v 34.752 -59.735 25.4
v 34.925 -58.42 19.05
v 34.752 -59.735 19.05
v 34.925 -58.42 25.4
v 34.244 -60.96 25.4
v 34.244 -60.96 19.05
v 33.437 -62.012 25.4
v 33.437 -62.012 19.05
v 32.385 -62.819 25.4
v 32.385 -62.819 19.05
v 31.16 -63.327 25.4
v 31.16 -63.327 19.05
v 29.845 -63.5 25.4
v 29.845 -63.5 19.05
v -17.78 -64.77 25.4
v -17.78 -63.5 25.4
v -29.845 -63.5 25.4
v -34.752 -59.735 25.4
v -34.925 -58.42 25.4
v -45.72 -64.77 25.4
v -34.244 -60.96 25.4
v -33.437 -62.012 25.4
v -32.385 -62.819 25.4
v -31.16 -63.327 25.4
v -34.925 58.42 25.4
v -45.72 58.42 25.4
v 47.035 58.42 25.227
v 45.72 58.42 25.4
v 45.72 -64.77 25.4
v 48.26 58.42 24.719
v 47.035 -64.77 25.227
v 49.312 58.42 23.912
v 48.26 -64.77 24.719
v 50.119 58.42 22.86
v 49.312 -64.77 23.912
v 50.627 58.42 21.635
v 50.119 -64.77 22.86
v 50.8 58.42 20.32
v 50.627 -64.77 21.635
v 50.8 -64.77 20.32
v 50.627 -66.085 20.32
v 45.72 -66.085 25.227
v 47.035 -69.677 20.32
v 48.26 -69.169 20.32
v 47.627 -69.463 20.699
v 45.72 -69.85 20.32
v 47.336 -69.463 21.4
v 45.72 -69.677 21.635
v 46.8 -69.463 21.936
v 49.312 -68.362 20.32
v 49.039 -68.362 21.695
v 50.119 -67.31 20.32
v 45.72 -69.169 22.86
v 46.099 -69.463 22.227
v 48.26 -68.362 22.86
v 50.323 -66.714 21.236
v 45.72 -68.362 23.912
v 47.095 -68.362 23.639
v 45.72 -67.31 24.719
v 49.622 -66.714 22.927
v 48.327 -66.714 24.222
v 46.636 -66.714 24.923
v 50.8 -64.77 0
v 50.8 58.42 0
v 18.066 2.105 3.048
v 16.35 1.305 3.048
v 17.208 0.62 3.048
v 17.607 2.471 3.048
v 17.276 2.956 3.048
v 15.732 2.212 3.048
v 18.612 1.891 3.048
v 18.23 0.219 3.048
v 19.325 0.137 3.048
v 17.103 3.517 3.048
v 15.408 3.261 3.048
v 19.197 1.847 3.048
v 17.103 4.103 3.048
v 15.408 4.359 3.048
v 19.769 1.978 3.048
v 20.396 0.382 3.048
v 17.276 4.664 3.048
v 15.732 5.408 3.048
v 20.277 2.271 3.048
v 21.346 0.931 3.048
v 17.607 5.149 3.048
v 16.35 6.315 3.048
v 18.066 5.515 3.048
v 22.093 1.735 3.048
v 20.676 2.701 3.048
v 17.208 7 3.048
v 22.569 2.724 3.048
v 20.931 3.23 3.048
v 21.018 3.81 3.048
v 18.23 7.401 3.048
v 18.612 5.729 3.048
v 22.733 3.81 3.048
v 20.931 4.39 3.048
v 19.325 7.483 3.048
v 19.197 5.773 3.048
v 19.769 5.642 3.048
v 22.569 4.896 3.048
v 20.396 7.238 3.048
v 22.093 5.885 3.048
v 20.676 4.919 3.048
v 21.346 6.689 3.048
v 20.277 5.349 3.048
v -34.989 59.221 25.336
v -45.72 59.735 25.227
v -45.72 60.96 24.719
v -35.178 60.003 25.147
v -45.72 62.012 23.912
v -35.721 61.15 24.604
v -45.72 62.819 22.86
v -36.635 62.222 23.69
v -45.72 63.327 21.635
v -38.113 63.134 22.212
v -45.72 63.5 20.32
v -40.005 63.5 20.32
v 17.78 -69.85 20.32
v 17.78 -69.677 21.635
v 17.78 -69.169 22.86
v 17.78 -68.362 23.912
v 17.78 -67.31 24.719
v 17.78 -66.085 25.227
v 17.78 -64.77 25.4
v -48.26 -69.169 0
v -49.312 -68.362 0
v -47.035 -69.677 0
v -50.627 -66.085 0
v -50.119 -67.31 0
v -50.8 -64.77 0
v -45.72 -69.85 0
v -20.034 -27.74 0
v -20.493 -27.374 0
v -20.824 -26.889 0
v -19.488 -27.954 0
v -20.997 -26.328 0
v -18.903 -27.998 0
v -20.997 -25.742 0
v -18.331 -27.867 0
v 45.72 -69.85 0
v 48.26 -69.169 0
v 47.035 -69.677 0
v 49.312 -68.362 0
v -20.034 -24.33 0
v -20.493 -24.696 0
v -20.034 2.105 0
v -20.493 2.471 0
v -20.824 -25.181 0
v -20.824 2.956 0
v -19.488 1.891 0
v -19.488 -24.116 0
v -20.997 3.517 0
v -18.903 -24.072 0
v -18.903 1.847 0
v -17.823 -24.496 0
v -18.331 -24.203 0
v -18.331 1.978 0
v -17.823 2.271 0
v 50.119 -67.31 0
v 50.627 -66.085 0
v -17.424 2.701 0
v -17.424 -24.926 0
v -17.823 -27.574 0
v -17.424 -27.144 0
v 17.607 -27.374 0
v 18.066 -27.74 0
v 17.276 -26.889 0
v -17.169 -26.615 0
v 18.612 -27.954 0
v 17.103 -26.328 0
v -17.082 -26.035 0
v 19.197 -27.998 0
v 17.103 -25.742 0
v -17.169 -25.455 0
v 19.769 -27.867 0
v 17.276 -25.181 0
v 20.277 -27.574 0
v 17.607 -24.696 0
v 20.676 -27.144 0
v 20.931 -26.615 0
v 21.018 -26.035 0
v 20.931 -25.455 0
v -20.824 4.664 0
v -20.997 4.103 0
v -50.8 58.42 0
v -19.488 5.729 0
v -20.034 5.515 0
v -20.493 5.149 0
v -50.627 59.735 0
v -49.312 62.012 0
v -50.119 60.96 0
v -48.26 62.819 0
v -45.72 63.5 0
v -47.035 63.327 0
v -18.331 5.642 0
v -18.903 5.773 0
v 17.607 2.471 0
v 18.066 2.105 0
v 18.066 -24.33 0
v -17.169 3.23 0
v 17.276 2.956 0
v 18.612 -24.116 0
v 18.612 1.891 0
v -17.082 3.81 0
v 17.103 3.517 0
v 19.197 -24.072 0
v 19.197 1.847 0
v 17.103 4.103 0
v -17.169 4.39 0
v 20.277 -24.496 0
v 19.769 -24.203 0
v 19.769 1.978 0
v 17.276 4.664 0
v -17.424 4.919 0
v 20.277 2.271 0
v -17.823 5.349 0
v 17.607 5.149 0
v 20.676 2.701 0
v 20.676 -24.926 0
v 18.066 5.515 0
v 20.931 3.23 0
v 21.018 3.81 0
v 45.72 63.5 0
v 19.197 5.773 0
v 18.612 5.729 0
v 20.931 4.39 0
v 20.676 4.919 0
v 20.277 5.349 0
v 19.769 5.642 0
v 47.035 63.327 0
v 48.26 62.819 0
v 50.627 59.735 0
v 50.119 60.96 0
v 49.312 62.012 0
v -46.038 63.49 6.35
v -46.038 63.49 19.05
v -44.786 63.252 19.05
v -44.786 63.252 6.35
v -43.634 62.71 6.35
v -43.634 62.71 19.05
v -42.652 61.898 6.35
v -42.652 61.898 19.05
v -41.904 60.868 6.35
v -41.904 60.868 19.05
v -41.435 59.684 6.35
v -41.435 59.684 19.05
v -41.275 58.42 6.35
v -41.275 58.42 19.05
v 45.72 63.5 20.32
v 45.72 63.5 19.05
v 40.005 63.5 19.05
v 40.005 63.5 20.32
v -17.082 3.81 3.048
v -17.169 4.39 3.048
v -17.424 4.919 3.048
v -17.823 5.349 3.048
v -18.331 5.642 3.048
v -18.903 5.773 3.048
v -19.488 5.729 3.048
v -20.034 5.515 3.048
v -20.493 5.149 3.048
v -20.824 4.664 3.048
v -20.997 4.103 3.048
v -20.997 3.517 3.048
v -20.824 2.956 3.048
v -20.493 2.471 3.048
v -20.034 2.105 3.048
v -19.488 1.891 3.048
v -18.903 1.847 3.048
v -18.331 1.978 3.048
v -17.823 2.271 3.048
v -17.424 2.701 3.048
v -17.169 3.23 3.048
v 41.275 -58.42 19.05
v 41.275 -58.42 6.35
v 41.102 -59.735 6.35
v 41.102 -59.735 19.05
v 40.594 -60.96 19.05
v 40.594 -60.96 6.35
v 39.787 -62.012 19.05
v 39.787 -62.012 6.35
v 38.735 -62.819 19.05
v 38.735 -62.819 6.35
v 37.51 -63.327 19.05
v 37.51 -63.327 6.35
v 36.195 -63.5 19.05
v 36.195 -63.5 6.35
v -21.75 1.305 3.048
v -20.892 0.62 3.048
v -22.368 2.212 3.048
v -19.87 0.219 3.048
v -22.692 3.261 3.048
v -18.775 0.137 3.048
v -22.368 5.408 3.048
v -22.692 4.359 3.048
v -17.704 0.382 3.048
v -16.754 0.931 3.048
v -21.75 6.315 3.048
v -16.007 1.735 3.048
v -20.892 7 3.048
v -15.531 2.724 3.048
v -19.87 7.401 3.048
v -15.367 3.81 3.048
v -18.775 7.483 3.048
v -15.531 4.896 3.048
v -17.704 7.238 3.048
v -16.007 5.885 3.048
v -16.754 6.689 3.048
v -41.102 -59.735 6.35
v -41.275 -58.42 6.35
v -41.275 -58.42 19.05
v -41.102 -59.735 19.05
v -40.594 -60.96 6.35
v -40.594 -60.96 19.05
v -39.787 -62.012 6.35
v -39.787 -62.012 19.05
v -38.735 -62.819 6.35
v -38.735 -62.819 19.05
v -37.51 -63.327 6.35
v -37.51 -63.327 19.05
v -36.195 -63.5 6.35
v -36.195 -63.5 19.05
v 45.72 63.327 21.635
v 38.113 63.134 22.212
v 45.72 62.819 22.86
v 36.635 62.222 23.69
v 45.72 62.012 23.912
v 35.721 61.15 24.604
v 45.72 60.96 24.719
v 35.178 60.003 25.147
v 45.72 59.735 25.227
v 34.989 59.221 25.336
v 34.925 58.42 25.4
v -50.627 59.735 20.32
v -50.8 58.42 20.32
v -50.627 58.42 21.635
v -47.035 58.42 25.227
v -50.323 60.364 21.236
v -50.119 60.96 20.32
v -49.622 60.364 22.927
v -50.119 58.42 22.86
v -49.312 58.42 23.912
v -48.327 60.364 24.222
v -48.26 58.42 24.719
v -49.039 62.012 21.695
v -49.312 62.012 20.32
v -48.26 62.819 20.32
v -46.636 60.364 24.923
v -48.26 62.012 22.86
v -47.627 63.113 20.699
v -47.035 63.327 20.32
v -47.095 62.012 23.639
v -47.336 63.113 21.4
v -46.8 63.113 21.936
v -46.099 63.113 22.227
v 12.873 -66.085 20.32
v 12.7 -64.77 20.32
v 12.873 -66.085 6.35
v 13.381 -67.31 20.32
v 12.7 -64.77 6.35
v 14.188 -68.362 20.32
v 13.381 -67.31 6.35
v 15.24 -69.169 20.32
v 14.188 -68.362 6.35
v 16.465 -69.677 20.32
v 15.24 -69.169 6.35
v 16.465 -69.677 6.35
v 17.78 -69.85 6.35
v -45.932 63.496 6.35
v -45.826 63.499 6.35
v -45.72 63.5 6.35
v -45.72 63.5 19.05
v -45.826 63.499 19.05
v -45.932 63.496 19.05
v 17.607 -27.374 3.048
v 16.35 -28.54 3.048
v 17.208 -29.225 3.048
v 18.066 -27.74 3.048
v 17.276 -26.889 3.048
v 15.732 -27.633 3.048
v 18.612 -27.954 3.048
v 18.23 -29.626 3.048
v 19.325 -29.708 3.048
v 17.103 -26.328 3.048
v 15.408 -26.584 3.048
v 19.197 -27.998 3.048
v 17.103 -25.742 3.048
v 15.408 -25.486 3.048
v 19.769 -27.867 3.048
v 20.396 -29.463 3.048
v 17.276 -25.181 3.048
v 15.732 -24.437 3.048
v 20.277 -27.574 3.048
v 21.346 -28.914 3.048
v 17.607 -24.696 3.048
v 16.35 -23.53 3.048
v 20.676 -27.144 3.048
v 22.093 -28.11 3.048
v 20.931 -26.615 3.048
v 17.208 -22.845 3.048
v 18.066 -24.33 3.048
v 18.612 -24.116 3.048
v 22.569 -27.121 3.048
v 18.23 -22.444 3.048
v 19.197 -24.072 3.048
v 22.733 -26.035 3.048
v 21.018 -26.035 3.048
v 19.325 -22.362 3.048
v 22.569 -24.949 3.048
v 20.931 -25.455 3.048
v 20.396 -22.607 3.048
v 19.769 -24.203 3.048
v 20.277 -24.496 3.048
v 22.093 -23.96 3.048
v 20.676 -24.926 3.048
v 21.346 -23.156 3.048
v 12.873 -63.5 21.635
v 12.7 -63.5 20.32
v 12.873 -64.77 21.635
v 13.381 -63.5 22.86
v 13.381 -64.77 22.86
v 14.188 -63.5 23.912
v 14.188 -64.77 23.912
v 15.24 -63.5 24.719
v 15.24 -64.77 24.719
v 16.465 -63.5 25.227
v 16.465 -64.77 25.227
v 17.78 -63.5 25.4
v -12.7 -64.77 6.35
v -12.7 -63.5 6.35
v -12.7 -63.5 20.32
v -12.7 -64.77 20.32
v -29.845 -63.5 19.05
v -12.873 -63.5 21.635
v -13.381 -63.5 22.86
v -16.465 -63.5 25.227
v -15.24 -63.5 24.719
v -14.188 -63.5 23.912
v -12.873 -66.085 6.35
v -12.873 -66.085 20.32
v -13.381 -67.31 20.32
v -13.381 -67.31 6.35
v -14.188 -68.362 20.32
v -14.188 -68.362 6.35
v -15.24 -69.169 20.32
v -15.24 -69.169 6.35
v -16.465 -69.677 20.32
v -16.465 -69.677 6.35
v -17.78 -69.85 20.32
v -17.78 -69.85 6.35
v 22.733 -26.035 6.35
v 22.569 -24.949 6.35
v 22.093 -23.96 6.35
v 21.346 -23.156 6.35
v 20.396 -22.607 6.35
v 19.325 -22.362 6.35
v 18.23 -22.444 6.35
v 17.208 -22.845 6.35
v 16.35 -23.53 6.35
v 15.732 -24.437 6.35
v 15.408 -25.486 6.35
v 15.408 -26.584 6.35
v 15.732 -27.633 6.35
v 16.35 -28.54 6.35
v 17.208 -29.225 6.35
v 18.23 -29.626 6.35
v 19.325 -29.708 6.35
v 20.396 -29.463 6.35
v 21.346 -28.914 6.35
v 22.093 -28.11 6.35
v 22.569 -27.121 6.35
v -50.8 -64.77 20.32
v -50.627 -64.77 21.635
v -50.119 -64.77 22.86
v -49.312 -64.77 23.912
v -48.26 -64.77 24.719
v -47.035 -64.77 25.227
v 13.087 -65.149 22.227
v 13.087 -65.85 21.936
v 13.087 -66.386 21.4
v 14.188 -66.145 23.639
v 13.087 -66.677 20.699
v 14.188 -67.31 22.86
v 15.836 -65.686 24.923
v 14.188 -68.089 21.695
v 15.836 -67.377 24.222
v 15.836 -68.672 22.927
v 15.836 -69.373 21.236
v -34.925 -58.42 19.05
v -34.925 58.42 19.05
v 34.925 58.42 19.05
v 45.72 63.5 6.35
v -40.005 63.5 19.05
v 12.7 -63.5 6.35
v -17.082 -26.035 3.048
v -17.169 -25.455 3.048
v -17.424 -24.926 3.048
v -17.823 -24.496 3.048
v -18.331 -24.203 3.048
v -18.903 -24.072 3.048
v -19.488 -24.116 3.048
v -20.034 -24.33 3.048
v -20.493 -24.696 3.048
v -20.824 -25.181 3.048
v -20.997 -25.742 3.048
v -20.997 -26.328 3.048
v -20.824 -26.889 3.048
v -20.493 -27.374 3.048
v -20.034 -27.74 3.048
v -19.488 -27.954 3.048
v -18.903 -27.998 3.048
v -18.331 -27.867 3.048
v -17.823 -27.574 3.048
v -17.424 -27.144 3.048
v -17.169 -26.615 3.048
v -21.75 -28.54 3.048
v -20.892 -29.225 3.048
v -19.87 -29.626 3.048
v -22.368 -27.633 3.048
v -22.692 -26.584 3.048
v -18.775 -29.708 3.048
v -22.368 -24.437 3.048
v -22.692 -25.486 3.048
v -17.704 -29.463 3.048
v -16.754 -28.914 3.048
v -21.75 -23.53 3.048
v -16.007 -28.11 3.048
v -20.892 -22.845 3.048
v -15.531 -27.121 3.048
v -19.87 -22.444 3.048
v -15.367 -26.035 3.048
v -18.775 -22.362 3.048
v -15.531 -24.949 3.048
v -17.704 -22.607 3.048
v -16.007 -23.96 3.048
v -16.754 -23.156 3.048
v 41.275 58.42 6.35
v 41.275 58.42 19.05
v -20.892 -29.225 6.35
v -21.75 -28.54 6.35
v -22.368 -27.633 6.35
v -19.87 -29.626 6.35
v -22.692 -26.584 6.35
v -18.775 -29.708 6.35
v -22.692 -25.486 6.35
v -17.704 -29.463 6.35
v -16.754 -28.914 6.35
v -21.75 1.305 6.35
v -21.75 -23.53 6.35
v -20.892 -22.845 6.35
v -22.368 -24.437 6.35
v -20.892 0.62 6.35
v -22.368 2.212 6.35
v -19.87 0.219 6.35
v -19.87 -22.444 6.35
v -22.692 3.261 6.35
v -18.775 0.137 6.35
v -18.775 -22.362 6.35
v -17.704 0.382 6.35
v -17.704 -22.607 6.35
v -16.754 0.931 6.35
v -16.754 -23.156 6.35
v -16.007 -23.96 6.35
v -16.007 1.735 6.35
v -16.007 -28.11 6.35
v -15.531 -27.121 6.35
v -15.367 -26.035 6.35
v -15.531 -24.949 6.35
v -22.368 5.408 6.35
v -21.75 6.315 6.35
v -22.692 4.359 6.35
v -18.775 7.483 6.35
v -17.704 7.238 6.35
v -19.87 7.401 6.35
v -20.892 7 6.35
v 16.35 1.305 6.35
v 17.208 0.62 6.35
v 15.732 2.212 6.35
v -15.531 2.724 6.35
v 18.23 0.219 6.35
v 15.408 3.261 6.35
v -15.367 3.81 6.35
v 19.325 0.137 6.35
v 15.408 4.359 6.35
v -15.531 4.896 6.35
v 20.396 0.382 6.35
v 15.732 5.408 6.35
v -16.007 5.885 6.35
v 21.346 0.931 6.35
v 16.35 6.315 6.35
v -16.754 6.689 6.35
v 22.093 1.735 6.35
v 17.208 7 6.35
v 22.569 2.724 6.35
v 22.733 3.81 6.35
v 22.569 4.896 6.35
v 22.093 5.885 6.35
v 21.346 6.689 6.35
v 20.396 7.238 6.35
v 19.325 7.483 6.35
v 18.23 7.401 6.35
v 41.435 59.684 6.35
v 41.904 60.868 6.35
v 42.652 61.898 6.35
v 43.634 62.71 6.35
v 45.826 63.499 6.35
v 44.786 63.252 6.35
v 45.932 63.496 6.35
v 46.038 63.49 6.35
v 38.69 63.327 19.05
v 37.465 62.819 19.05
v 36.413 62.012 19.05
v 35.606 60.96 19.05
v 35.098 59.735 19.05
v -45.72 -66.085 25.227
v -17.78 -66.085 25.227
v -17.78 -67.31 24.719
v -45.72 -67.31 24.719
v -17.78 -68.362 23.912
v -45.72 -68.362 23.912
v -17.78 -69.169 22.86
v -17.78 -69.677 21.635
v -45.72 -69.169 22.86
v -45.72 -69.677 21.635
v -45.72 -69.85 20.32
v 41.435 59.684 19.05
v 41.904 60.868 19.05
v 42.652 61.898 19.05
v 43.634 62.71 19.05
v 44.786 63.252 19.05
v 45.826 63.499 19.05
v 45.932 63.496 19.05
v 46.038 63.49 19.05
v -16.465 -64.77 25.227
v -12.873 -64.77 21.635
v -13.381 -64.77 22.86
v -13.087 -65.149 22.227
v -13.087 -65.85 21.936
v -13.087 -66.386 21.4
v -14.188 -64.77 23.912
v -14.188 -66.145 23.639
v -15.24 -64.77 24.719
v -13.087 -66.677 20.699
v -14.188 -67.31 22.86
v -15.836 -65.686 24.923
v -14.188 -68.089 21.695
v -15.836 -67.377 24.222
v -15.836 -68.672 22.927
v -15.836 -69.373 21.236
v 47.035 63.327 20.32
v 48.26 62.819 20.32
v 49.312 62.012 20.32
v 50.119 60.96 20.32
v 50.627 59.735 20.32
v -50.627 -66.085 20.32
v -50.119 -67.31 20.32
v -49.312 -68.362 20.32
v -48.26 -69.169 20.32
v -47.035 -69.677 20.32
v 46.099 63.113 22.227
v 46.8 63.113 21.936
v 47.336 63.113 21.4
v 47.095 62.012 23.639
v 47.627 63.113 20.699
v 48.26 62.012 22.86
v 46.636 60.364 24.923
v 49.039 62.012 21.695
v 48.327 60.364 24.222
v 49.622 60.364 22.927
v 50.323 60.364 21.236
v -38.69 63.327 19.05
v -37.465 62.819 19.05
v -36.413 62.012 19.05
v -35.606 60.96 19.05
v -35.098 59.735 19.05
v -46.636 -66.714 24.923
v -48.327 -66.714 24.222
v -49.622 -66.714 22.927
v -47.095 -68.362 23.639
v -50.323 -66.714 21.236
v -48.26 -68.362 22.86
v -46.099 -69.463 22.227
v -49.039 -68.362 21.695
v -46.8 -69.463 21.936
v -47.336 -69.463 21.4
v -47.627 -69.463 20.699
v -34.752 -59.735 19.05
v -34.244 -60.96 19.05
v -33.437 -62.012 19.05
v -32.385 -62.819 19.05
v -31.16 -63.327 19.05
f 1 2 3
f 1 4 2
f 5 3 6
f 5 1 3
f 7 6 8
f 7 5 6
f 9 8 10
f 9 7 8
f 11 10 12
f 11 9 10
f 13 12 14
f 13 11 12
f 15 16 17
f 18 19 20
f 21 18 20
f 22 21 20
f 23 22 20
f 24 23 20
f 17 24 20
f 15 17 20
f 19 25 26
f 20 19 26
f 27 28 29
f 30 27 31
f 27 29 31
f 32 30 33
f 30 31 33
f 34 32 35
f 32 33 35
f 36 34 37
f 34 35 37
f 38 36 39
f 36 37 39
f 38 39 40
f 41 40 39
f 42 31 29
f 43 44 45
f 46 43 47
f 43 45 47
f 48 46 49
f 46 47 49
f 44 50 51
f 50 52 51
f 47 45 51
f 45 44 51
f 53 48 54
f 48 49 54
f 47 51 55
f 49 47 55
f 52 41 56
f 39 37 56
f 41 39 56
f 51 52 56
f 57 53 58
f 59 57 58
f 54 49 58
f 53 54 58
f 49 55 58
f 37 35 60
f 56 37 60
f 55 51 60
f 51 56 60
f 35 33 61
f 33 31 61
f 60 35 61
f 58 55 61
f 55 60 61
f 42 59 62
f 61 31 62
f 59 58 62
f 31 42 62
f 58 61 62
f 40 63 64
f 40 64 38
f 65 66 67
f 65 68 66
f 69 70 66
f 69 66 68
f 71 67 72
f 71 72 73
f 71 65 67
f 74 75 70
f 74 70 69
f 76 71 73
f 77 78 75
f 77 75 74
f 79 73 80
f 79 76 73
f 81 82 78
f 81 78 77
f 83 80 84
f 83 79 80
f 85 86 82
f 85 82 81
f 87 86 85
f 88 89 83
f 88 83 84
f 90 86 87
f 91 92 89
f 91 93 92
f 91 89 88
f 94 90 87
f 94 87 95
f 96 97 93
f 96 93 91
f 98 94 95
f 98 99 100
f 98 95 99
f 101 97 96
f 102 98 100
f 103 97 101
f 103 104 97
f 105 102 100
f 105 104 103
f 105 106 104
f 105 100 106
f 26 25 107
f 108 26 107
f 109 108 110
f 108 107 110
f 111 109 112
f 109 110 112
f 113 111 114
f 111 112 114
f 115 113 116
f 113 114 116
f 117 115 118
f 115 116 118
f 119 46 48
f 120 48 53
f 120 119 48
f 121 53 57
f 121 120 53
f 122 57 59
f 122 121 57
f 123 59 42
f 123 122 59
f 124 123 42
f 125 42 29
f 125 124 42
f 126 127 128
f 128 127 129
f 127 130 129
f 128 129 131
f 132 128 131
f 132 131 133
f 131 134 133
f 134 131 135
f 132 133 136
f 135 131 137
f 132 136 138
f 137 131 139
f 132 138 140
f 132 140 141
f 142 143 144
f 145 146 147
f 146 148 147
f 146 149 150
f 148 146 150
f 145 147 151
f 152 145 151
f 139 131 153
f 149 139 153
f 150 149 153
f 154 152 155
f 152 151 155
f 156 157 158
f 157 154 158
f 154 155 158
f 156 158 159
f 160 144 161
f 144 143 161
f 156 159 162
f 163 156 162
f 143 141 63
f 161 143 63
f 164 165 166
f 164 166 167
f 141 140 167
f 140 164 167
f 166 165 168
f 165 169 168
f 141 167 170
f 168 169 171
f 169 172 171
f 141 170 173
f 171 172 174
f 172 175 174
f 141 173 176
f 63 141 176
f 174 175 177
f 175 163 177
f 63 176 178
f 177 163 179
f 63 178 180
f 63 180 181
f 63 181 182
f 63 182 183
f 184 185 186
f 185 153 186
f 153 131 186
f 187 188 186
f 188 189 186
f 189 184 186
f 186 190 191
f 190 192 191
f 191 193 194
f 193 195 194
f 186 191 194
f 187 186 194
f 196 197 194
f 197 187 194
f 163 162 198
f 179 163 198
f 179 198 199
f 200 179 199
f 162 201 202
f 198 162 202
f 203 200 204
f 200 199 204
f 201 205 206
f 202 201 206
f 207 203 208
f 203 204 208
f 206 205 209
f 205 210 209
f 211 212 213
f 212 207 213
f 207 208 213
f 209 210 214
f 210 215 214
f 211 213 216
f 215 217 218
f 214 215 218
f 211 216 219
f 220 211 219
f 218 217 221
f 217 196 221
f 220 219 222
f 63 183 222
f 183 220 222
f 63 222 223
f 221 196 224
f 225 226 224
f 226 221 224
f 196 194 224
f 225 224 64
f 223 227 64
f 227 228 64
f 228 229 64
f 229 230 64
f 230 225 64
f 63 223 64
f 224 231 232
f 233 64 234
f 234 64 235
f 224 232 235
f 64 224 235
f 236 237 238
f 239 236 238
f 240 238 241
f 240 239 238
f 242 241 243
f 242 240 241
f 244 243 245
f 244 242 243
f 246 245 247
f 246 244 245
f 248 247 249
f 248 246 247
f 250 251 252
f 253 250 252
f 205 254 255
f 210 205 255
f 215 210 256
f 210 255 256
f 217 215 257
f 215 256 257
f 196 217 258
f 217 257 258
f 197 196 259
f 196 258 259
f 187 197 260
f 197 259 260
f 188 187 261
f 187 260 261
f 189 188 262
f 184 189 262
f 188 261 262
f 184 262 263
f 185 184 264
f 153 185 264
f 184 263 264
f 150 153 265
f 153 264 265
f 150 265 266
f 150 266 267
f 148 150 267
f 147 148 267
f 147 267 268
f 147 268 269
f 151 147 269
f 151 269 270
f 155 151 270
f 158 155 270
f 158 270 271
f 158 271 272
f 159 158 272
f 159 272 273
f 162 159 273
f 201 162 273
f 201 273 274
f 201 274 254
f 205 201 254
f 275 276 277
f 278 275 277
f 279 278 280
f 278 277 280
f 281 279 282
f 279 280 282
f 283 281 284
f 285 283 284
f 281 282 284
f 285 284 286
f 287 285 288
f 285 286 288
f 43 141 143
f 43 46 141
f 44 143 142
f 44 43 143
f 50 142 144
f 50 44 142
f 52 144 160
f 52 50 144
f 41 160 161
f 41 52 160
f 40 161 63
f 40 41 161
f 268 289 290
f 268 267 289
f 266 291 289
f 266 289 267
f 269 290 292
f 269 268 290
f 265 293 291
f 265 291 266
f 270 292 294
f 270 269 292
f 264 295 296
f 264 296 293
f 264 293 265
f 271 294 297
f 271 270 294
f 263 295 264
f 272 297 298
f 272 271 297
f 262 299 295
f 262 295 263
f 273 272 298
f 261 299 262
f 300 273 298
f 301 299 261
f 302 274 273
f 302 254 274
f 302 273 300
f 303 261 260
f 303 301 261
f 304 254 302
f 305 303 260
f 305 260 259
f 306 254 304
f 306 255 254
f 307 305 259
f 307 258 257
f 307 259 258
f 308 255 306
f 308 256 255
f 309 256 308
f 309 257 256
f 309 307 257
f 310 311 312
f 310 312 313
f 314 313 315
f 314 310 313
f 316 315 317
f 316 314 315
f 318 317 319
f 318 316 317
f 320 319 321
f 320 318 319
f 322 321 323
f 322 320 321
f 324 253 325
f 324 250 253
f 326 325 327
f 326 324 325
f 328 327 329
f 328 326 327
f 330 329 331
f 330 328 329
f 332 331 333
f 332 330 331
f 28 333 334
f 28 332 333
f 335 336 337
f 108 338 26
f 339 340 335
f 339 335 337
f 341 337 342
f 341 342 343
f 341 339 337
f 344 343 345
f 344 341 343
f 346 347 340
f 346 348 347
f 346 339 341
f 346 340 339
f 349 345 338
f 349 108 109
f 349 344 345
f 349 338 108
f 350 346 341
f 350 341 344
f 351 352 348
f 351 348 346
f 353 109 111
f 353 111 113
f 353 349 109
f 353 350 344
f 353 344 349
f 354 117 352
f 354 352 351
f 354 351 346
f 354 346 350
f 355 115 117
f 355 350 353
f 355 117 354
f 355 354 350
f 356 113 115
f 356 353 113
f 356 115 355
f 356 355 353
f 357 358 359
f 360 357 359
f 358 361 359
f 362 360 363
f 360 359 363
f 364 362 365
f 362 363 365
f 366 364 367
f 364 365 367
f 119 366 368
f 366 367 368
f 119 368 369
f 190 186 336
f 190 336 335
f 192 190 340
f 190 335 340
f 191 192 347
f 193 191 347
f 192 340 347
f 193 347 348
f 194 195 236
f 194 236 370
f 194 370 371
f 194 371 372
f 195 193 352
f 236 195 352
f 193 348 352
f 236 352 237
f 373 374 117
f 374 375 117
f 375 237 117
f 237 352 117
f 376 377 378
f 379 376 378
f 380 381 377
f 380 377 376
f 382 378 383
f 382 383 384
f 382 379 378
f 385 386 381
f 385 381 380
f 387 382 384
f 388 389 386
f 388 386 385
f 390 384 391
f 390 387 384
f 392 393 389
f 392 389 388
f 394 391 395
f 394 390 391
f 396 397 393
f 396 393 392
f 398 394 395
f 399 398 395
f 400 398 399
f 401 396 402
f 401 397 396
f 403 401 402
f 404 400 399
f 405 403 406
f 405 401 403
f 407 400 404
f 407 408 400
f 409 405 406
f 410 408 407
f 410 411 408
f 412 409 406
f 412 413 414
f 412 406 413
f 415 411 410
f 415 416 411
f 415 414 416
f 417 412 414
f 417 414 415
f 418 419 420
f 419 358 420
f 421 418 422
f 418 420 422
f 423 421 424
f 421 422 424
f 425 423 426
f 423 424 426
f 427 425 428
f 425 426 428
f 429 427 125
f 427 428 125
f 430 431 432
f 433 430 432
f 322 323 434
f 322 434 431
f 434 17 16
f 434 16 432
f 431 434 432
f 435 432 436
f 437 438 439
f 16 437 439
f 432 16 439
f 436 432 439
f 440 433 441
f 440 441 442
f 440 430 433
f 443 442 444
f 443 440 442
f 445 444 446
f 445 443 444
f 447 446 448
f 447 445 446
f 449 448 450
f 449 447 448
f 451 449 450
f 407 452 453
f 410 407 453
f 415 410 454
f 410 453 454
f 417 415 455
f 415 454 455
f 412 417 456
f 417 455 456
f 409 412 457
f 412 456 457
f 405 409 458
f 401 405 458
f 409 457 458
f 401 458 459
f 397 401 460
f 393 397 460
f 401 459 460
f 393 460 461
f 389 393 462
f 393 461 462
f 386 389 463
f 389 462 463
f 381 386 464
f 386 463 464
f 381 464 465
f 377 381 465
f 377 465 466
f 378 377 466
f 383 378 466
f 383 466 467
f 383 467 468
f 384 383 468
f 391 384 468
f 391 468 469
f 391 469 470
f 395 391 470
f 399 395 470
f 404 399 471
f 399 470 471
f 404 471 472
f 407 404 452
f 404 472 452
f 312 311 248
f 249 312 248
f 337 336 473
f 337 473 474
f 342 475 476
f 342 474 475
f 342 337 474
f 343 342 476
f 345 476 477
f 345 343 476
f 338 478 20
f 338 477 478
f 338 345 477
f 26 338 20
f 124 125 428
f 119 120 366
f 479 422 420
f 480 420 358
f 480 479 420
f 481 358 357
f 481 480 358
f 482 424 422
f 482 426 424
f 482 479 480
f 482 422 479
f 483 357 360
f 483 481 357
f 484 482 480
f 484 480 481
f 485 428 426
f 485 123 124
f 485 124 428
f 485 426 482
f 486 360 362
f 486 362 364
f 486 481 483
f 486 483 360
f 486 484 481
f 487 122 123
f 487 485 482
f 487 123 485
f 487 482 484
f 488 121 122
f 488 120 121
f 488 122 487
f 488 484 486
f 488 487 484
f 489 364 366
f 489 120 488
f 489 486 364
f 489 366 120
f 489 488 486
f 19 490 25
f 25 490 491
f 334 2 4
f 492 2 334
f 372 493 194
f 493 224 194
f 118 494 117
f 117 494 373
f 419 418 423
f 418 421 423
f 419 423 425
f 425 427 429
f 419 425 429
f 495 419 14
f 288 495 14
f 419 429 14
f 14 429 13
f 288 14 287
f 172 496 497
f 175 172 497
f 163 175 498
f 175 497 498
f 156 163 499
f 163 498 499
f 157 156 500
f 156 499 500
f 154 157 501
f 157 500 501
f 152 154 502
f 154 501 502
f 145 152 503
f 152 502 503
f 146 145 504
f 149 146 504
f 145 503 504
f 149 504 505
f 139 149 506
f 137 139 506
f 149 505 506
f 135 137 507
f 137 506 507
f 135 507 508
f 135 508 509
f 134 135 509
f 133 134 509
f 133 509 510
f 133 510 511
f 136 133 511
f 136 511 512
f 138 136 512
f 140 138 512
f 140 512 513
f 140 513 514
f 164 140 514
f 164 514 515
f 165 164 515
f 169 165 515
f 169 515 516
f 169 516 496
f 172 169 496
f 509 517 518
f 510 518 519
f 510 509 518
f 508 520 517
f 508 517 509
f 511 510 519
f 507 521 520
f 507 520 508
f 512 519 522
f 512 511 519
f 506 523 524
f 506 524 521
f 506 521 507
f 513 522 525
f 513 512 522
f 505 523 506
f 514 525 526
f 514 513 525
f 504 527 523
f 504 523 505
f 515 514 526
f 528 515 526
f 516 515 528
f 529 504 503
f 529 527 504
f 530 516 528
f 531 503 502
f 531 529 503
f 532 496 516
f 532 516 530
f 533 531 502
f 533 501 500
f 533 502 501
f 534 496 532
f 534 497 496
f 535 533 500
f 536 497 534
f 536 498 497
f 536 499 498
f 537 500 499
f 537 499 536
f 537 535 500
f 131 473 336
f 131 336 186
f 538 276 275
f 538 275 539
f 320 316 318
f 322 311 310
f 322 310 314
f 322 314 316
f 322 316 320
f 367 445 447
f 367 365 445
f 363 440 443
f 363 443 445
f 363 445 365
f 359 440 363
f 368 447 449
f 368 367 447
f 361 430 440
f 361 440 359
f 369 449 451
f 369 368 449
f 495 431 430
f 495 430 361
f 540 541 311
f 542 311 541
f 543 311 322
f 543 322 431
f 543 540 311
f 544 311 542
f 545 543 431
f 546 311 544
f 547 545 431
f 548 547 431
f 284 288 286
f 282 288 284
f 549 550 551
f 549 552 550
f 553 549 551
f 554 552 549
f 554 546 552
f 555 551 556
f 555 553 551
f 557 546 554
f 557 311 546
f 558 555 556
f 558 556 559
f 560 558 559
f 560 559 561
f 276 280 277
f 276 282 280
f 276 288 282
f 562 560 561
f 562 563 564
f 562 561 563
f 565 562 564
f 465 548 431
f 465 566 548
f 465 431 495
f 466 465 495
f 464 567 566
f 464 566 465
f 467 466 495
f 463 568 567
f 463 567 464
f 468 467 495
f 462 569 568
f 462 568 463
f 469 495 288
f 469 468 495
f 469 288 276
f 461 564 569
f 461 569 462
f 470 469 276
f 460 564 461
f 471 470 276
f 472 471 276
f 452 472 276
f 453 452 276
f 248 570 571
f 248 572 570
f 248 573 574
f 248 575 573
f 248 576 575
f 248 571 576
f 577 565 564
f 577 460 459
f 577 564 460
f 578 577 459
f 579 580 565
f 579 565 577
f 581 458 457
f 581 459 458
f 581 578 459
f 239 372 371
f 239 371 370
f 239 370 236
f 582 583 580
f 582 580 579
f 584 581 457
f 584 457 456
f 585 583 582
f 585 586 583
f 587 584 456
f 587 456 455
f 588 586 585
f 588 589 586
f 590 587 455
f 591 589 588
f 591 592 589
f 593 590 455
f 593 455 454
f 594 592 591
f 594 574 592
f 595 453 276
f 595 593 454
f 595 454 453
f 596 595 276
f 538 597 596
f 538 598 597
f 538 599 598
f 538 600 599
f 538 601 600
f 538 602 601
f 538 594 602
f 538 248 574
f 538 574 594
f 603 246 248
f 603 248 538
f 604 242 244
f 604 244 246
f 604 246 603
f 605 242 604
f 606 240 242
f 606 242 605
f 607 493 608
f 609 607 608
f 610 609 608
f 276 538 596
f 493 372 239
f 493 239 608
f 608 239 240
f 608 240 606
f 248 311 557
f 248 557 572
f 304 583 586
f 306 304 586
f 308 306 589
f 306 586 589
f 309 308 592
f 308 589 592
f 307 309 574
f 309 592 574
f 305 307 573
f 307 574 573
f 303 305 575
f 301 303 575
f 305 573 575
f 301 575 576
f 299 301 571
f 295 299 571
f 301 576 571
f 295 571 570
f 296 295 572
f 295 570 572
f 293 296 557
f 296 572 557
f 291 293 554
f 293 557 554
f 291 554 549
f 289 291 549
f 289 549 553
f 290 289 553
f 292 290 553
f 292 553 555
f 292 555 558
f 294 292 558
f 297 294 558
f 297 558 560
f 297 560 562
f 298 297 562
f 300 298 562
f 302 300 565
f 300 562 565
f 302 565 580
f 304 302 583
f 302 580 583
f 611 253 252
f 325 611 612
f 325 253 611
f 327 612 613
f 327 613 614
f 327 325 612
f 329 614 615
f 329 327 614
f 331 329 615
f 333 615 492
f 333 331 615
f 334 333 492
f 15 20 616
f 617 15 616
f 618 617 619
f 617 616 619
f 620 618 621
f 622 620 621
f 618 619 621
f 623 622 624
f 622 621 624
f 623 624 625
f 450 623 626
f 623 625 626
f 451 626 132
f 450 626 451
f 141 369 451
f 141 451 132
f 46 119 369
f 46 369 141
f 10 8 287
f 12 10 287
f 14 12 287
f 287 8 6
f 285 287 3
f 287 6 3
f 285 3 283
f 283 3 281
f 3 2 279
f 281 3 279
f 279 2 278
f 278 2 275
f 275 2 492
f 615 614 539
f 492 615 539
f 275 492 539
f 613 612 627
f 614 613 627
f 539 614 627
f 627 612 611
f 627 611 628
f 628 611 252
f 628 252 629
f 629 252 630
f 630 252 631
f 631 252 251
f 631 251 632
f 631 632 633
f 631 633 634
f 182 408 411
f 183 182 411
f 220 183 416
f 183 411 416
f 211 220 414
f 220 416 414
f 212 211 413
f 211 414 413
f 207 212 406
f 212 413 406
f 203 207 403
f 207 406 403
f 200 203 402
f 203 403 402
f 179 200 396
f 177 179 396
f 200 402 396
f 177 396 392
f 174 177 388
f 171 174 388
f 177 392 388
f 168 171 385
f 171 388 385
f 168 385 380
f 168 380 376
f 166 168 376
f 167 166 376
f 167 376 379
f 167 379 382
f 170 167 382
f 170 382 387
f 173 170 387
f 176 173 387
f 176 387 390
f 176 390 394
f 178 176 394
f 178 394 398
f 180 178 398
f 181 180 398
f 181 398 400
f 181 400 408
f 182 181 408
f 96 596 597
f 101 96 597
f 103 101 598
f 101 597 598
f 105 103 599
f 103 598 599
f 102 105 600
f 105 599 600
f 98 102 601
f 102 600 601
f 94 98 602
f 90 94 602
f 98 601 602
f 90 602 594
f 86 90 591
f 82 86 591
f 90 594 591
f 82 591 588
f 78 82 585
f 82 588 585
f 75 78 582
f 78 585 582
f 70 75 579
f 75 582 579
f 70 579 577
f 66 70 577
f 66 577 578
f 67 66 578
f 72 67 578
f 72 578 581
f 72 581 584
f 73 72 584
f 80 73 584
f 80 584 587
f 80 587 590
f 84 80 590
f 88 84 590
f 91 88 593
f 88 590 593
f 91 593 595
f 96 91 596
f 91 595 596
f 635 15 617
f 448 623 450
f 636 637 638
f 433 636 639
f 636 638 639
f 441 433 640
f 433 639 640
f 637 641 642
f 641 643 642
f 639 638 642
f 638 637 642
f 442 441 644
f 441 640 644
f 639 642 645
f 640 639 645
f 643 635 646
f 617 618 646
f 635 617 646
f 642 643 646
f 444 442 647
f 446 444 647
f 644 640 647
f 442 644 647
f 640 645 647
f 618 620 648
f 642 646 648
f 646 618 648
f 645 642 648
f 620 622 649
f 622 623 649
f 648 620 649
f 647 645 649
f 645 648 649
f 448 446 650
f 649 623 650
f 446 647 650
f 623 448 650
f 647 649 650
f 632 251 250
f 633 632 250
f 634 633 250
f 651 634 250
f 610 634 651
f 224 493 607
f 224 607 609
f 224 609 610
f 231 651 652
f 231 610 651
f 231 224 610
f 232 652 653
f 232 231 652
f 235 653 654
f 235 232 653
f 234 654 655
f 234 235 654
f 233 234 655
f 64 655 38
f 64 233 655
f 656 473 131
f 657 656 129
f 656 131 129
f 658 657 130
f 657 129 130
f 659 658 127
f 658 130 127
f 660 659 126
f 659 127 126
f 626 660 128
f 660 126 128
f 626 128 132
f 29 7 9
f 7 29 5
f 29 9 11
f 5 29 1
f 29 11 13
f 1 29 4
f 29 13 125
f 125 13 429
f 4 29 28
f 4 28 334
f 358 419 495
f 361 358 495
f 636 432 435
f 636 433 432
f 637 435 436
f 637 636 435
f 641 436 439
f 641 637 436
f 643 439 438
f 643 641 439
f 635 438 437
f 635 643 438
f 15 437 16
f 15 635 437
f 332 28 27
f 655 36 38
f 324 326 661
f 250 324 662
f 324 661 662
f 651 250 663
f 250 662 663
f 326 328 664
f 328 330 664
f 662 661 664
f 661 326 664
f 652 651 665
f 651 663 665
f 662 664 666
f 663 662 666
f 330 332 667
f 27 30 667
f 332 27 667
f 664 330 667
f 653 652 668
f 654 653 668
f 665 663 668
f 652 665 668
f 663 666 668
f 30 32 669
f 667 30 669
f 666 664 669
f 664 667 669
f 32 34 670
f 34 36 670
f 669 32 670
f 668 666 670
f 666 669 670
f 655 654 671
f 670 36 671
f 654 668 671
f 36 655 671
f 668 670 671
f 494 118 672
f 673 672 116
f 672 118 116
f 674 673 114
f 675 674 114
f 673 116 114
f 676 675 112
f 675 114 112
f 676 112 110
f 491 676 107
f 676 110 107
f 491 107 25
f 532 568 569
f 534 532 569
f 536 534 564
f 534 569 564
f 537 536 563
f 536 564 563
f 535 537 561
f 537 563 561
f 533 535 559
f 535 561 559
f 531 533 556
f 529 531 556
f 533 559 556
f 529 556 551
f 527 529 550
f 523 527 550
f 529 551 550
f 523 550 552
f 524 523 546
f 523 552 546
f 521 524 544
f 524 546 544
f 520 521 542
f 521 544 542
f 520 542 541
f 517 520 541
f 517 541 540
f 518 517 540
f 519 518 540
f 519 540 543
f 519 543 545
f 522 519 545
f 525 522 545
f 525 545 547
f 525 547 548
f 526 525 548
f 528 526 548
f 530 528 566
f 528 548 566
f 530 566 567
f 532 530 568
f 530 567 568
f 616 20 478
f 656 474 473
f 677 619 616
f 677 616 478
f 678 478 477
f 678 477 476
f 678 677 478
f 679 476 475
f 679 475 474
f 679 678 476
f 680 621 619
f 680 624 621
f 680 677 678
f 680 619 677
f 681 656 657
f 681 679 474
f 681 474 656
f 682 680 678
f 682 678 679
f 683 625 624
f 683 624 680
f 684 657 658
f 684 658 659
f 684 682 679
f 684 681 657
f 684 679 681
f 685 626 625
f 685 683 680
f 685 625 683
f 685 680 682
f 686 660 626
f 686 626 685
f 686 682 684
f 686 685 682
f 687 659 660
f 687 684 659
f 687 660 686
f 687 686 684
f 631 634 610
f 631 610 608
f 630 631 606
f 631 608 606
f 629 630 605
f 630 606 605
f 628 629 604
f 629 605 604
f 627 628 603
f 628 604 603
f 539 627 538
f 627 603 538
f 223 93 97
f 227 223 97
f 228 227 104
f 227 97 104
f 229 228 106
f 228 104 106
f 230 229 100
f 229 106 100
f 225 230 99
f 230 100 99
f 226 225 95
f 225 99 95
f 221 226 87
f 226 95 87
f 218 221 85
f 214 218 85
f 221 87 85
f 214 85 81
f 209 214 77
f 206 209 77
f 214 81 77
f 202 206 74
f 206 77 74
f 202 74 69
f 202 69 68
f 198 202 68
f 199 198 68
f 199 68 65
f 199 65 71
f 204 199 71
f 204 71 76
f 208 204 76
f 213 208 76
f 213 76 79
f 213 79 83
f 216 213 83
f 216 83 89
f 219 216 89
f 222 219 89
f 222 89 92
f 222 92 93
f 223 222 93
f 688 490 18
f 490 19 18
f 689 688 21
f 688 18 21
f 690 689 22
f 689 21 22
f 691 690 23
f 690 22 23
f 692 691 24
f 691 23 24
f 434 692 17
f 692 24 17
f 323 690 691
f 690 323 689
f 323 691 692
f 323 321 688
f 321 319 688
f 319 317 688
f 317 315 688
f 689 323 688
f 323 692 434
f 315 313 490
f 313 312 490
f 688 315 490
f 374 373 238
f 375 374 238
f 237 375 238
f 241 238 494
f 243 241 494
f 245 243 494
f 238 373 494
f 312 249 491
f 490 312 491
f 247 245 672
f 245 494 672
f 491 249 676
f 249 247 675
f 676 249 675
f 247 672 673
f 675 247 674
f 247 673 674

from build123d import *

# Parameters (mm, degrees)
F0_W          = 101.6
F0_H          = 127
F1_DEPTH      = 6.35
F2_W          = 9.525
F2_H          = 127
F3_DEPTH      = 12.7
F4_W          = 6.35
F4_H          = 127
F4_W_2        = 9.525
F4_W_3        = 15.875
F5_DEPTH      = 6.35
F6_R          = 3.683
F7_DEPTH      = 3.302
F8_R          = 1.9685
F9_DEPTH      = 25.4
F10_W         = 25.4
F10_H         = 6.35
F11_DEPTH     = 6.35
F12_R         = 5.08
F13_R         = 5.08
F14_T4_DEPTH  = 25.4
F14_T9_DEPTH  = 25.4
F14_T11_DEPTH = 12.7
F15_R         = 5.08


# Not quite as in the source:
# - a fillet or chamfer that OpenCascade refuses, or shapes differently, is made with other operations: its cross-section is extruded or revolved along the edge and cut away or added


with BuildPart() as f1:
    # F0 (on Top) → F1 (new body)
    with BuildSketch(Plane.XY):
        Rectangle(F0_W, F0_H)
    extrude(amount=F1_DEPTH)

    # F2 (on face) → F3 (join)
    with BuildSketch(Plane.XY.offset(6.35)):
        with Locations((-46.0375, 0)):
            Rectangle(F2_W, F2_H)
        with Locations((46.0375, 0)):
            Rectangle(F2_W, F2_H)
    extrude(amount=F3_DEPTH)

    # F4 (on face) → F5 (join)
    with BuildSketch(Plane.XY.offset(19.05)):
        with Locations((-38.1, 0)):
            Rectangle(F4_W, F4_H)
        with Locations((-46.0375, 0)):
            Rectangle(F4_W_2, F4_H)
        with Locations((42.8625, 0)):
            Rectangle(F4_W_3, F4_H)
    extrude(amount=F5_DEPTH)

    # F6 (on face) → F7 (cut)
    with BuildSketch(Plane.XY.offset(6.35)):
        with Locations((-19.05, 3.81)):
            Circle(F6_R)
        with Locations((-19.05, -26.035)):
            Circle(F6_R)
        with Locations((19.05, -26.035)):
            Circle(F6_R)
        with Locations((19.05, 3.81)):
            Circle(F6_R)
    extrude(amount=-F7_DEPTH, mode=Mode.SUBTRACT)

    # F8 (on face) → F9 (cut)
    with BuildSketch(Plane.XY.offset(3.048)):
        with Locations((-19.05, 3.81)):
            Circle(F8_R)
        with Locations((19.05, 3.81)):
            Circle(F8_R)
        with Locations((-19.05, -26.035)):
            Circle(F8_R)
        with Locations((19.05, -26.035)):
            Circle(F8_R)
    extrude(amount=-F9_DEPTH, mode=Mode.SUBTRACT)

    # F10 (on face) → F11 (join)
    with BuildSketch(Plane.XZ.offset(63.5)):
        Polygon((-34.925, 25.4), (-50.8, 25.4), (-50.8, 0), (-12.7, 0), (-12.7, 6.35), (-41.275, 6.35), (-41.275, 19.05), (-34.925, 19.05), align=None)
        Polygon((-12.7, 25.4), (-34.925, 25.4), (-34.925, 19.05), (-41.275, 19.05), (-41.275, 6.35), (-12.7, 6.35), align=None)
        Polygon((34.925, 25.4), (12.7, 25.4), (12.7, 6.35), (41.275, 6.35), (41.275, 19.05), (34.925, 19.05), align=None)
        Polygon((12.7, 6.35), (12.7, 0), (50.8, 0), (50.8, 25.4), (34.925, 25.4), (34.925, 19.05), (41.275, 19.05), (41.275, 6.35), align=None)
        with Locations((0, 3.175)):
            Rectangle(F10_W, F10_H)
    extrude(amount=F11_DEPTH)

    # F12
    f12_edges = [f1.edges().sort_by_distance(p)[0] for p in [
        (-50.8, -3.175, 25.4),
        (50.8, -3.175, 25.4),
    ]]
    fillet(f12_edges, radius=F12_R)

    # F13
    f13_edges = [f1.edges().sort_by_distance(p)[0] for p in [
        (-34.925, 63.5, 22.225),
        (34.925, 63.5, 22.225),
        (-50.8, 63.5, 10.16),
        (50.8, 63.5, 10.16),
        (-50.8, -69.85, 10.16),
        (50.8, -69.85, 10.16),
        (-34.925, -63.5, 22.225),
        (34.925, -63.5, 22.225),
    ]]
    fillet(f13_edges, radius=F13_R)

    # F14: fillet of radius 5.08 on 4 edges, made by hand


with BuildPart() as f14_tool2:
    # F14_s3 → F14_t4 (new body)
    with BuildSketch(Plane.XY.offset(6.35)):
        with BuildLine():
            ThreePointArc((-41.275, -58.42), (-39.7871024484, -62.0121024484), (-36.195, -63.5))
            Line((-36.195, -63.5), (-41.275, -63.5))
            Line((-41.275, -63.5), (-41.275, -58.42))
        make_face()
    extrude(amount=F14_T4_DEPTH)

    split(bisect_by=Plane.XY.offset(25.4), keep=Keep.BOTTOM)


with BuildPart() as f1_1:
    add(f1.part)

    # F14_t1: union F14_tool2
    add(f14_tool2.part)


with BuildPart() as f14_tool7:
    # F14_s8 → F14_t9 (new body)
    with BuildSketch(Plane.XY.offset(6.35)):
        with BuildLine():
            ThreePointArc((41.275, -58.42), (39.7871024484, -62.0121024484), (36.195, -63.5))
            Line((36.195, -63.5), (41.275, -63.5))
            Line((41.275, -63.5), (41.275, -58.42))
        make_face()
    extrude(amount=F14_T9_DEPTH)

    split(bisect_by=Plane.XY.offset(25.4), keep=Keep.BOTTOM)


with BuildPart() as f1_2:
    add(f1_1.part)

    # F14_t6: union F14_tool7
    add(f14_tool7.part)

    # F14_s12 → F14_t11 (cut)
    with BuildSketch(Plane.XY.offset(6.35)):
        with BuildLine():
            ThreePointArc((-46.355, 63.5), (-42.7628975516, 62.0121024484), (-41.275, 58.42))
            Line((-41.275, 58.42), (-41.275, 63.5))
            Line((-41.275, 63.5), (-46.355, 63.5))
        make_face()
        with BuildLine():
            ThreePointArc((46.355, 63.5), (42.7628975516, 62.0121024484), (41.275, 58.42))
            Line((41.275, 58.42), (41.275, 63.5))
            Line((41.275, 63.5), (46.355, 63.5))
        make_face()
    extrude(amount=F14_T11_DEPTH, mode=Mode.SUBTRACT)

    # F15
    f15_edges = [f1_2.edges().sort_by_distance(p)[0] for p in [
        (-12.7, -64.135, 25.4),
        (12.7, -64.135, 25.4),
        (-12.7, -69.85, 13.335),
        (12.7, -69.85, 13.335),
        (12.7, -68.362102, 23.912102),
        (-12.7, -68.362102, 23.912102),
    ]]
    fillet(f15_edges, radius=F15_R)


solid = f1_2.part
